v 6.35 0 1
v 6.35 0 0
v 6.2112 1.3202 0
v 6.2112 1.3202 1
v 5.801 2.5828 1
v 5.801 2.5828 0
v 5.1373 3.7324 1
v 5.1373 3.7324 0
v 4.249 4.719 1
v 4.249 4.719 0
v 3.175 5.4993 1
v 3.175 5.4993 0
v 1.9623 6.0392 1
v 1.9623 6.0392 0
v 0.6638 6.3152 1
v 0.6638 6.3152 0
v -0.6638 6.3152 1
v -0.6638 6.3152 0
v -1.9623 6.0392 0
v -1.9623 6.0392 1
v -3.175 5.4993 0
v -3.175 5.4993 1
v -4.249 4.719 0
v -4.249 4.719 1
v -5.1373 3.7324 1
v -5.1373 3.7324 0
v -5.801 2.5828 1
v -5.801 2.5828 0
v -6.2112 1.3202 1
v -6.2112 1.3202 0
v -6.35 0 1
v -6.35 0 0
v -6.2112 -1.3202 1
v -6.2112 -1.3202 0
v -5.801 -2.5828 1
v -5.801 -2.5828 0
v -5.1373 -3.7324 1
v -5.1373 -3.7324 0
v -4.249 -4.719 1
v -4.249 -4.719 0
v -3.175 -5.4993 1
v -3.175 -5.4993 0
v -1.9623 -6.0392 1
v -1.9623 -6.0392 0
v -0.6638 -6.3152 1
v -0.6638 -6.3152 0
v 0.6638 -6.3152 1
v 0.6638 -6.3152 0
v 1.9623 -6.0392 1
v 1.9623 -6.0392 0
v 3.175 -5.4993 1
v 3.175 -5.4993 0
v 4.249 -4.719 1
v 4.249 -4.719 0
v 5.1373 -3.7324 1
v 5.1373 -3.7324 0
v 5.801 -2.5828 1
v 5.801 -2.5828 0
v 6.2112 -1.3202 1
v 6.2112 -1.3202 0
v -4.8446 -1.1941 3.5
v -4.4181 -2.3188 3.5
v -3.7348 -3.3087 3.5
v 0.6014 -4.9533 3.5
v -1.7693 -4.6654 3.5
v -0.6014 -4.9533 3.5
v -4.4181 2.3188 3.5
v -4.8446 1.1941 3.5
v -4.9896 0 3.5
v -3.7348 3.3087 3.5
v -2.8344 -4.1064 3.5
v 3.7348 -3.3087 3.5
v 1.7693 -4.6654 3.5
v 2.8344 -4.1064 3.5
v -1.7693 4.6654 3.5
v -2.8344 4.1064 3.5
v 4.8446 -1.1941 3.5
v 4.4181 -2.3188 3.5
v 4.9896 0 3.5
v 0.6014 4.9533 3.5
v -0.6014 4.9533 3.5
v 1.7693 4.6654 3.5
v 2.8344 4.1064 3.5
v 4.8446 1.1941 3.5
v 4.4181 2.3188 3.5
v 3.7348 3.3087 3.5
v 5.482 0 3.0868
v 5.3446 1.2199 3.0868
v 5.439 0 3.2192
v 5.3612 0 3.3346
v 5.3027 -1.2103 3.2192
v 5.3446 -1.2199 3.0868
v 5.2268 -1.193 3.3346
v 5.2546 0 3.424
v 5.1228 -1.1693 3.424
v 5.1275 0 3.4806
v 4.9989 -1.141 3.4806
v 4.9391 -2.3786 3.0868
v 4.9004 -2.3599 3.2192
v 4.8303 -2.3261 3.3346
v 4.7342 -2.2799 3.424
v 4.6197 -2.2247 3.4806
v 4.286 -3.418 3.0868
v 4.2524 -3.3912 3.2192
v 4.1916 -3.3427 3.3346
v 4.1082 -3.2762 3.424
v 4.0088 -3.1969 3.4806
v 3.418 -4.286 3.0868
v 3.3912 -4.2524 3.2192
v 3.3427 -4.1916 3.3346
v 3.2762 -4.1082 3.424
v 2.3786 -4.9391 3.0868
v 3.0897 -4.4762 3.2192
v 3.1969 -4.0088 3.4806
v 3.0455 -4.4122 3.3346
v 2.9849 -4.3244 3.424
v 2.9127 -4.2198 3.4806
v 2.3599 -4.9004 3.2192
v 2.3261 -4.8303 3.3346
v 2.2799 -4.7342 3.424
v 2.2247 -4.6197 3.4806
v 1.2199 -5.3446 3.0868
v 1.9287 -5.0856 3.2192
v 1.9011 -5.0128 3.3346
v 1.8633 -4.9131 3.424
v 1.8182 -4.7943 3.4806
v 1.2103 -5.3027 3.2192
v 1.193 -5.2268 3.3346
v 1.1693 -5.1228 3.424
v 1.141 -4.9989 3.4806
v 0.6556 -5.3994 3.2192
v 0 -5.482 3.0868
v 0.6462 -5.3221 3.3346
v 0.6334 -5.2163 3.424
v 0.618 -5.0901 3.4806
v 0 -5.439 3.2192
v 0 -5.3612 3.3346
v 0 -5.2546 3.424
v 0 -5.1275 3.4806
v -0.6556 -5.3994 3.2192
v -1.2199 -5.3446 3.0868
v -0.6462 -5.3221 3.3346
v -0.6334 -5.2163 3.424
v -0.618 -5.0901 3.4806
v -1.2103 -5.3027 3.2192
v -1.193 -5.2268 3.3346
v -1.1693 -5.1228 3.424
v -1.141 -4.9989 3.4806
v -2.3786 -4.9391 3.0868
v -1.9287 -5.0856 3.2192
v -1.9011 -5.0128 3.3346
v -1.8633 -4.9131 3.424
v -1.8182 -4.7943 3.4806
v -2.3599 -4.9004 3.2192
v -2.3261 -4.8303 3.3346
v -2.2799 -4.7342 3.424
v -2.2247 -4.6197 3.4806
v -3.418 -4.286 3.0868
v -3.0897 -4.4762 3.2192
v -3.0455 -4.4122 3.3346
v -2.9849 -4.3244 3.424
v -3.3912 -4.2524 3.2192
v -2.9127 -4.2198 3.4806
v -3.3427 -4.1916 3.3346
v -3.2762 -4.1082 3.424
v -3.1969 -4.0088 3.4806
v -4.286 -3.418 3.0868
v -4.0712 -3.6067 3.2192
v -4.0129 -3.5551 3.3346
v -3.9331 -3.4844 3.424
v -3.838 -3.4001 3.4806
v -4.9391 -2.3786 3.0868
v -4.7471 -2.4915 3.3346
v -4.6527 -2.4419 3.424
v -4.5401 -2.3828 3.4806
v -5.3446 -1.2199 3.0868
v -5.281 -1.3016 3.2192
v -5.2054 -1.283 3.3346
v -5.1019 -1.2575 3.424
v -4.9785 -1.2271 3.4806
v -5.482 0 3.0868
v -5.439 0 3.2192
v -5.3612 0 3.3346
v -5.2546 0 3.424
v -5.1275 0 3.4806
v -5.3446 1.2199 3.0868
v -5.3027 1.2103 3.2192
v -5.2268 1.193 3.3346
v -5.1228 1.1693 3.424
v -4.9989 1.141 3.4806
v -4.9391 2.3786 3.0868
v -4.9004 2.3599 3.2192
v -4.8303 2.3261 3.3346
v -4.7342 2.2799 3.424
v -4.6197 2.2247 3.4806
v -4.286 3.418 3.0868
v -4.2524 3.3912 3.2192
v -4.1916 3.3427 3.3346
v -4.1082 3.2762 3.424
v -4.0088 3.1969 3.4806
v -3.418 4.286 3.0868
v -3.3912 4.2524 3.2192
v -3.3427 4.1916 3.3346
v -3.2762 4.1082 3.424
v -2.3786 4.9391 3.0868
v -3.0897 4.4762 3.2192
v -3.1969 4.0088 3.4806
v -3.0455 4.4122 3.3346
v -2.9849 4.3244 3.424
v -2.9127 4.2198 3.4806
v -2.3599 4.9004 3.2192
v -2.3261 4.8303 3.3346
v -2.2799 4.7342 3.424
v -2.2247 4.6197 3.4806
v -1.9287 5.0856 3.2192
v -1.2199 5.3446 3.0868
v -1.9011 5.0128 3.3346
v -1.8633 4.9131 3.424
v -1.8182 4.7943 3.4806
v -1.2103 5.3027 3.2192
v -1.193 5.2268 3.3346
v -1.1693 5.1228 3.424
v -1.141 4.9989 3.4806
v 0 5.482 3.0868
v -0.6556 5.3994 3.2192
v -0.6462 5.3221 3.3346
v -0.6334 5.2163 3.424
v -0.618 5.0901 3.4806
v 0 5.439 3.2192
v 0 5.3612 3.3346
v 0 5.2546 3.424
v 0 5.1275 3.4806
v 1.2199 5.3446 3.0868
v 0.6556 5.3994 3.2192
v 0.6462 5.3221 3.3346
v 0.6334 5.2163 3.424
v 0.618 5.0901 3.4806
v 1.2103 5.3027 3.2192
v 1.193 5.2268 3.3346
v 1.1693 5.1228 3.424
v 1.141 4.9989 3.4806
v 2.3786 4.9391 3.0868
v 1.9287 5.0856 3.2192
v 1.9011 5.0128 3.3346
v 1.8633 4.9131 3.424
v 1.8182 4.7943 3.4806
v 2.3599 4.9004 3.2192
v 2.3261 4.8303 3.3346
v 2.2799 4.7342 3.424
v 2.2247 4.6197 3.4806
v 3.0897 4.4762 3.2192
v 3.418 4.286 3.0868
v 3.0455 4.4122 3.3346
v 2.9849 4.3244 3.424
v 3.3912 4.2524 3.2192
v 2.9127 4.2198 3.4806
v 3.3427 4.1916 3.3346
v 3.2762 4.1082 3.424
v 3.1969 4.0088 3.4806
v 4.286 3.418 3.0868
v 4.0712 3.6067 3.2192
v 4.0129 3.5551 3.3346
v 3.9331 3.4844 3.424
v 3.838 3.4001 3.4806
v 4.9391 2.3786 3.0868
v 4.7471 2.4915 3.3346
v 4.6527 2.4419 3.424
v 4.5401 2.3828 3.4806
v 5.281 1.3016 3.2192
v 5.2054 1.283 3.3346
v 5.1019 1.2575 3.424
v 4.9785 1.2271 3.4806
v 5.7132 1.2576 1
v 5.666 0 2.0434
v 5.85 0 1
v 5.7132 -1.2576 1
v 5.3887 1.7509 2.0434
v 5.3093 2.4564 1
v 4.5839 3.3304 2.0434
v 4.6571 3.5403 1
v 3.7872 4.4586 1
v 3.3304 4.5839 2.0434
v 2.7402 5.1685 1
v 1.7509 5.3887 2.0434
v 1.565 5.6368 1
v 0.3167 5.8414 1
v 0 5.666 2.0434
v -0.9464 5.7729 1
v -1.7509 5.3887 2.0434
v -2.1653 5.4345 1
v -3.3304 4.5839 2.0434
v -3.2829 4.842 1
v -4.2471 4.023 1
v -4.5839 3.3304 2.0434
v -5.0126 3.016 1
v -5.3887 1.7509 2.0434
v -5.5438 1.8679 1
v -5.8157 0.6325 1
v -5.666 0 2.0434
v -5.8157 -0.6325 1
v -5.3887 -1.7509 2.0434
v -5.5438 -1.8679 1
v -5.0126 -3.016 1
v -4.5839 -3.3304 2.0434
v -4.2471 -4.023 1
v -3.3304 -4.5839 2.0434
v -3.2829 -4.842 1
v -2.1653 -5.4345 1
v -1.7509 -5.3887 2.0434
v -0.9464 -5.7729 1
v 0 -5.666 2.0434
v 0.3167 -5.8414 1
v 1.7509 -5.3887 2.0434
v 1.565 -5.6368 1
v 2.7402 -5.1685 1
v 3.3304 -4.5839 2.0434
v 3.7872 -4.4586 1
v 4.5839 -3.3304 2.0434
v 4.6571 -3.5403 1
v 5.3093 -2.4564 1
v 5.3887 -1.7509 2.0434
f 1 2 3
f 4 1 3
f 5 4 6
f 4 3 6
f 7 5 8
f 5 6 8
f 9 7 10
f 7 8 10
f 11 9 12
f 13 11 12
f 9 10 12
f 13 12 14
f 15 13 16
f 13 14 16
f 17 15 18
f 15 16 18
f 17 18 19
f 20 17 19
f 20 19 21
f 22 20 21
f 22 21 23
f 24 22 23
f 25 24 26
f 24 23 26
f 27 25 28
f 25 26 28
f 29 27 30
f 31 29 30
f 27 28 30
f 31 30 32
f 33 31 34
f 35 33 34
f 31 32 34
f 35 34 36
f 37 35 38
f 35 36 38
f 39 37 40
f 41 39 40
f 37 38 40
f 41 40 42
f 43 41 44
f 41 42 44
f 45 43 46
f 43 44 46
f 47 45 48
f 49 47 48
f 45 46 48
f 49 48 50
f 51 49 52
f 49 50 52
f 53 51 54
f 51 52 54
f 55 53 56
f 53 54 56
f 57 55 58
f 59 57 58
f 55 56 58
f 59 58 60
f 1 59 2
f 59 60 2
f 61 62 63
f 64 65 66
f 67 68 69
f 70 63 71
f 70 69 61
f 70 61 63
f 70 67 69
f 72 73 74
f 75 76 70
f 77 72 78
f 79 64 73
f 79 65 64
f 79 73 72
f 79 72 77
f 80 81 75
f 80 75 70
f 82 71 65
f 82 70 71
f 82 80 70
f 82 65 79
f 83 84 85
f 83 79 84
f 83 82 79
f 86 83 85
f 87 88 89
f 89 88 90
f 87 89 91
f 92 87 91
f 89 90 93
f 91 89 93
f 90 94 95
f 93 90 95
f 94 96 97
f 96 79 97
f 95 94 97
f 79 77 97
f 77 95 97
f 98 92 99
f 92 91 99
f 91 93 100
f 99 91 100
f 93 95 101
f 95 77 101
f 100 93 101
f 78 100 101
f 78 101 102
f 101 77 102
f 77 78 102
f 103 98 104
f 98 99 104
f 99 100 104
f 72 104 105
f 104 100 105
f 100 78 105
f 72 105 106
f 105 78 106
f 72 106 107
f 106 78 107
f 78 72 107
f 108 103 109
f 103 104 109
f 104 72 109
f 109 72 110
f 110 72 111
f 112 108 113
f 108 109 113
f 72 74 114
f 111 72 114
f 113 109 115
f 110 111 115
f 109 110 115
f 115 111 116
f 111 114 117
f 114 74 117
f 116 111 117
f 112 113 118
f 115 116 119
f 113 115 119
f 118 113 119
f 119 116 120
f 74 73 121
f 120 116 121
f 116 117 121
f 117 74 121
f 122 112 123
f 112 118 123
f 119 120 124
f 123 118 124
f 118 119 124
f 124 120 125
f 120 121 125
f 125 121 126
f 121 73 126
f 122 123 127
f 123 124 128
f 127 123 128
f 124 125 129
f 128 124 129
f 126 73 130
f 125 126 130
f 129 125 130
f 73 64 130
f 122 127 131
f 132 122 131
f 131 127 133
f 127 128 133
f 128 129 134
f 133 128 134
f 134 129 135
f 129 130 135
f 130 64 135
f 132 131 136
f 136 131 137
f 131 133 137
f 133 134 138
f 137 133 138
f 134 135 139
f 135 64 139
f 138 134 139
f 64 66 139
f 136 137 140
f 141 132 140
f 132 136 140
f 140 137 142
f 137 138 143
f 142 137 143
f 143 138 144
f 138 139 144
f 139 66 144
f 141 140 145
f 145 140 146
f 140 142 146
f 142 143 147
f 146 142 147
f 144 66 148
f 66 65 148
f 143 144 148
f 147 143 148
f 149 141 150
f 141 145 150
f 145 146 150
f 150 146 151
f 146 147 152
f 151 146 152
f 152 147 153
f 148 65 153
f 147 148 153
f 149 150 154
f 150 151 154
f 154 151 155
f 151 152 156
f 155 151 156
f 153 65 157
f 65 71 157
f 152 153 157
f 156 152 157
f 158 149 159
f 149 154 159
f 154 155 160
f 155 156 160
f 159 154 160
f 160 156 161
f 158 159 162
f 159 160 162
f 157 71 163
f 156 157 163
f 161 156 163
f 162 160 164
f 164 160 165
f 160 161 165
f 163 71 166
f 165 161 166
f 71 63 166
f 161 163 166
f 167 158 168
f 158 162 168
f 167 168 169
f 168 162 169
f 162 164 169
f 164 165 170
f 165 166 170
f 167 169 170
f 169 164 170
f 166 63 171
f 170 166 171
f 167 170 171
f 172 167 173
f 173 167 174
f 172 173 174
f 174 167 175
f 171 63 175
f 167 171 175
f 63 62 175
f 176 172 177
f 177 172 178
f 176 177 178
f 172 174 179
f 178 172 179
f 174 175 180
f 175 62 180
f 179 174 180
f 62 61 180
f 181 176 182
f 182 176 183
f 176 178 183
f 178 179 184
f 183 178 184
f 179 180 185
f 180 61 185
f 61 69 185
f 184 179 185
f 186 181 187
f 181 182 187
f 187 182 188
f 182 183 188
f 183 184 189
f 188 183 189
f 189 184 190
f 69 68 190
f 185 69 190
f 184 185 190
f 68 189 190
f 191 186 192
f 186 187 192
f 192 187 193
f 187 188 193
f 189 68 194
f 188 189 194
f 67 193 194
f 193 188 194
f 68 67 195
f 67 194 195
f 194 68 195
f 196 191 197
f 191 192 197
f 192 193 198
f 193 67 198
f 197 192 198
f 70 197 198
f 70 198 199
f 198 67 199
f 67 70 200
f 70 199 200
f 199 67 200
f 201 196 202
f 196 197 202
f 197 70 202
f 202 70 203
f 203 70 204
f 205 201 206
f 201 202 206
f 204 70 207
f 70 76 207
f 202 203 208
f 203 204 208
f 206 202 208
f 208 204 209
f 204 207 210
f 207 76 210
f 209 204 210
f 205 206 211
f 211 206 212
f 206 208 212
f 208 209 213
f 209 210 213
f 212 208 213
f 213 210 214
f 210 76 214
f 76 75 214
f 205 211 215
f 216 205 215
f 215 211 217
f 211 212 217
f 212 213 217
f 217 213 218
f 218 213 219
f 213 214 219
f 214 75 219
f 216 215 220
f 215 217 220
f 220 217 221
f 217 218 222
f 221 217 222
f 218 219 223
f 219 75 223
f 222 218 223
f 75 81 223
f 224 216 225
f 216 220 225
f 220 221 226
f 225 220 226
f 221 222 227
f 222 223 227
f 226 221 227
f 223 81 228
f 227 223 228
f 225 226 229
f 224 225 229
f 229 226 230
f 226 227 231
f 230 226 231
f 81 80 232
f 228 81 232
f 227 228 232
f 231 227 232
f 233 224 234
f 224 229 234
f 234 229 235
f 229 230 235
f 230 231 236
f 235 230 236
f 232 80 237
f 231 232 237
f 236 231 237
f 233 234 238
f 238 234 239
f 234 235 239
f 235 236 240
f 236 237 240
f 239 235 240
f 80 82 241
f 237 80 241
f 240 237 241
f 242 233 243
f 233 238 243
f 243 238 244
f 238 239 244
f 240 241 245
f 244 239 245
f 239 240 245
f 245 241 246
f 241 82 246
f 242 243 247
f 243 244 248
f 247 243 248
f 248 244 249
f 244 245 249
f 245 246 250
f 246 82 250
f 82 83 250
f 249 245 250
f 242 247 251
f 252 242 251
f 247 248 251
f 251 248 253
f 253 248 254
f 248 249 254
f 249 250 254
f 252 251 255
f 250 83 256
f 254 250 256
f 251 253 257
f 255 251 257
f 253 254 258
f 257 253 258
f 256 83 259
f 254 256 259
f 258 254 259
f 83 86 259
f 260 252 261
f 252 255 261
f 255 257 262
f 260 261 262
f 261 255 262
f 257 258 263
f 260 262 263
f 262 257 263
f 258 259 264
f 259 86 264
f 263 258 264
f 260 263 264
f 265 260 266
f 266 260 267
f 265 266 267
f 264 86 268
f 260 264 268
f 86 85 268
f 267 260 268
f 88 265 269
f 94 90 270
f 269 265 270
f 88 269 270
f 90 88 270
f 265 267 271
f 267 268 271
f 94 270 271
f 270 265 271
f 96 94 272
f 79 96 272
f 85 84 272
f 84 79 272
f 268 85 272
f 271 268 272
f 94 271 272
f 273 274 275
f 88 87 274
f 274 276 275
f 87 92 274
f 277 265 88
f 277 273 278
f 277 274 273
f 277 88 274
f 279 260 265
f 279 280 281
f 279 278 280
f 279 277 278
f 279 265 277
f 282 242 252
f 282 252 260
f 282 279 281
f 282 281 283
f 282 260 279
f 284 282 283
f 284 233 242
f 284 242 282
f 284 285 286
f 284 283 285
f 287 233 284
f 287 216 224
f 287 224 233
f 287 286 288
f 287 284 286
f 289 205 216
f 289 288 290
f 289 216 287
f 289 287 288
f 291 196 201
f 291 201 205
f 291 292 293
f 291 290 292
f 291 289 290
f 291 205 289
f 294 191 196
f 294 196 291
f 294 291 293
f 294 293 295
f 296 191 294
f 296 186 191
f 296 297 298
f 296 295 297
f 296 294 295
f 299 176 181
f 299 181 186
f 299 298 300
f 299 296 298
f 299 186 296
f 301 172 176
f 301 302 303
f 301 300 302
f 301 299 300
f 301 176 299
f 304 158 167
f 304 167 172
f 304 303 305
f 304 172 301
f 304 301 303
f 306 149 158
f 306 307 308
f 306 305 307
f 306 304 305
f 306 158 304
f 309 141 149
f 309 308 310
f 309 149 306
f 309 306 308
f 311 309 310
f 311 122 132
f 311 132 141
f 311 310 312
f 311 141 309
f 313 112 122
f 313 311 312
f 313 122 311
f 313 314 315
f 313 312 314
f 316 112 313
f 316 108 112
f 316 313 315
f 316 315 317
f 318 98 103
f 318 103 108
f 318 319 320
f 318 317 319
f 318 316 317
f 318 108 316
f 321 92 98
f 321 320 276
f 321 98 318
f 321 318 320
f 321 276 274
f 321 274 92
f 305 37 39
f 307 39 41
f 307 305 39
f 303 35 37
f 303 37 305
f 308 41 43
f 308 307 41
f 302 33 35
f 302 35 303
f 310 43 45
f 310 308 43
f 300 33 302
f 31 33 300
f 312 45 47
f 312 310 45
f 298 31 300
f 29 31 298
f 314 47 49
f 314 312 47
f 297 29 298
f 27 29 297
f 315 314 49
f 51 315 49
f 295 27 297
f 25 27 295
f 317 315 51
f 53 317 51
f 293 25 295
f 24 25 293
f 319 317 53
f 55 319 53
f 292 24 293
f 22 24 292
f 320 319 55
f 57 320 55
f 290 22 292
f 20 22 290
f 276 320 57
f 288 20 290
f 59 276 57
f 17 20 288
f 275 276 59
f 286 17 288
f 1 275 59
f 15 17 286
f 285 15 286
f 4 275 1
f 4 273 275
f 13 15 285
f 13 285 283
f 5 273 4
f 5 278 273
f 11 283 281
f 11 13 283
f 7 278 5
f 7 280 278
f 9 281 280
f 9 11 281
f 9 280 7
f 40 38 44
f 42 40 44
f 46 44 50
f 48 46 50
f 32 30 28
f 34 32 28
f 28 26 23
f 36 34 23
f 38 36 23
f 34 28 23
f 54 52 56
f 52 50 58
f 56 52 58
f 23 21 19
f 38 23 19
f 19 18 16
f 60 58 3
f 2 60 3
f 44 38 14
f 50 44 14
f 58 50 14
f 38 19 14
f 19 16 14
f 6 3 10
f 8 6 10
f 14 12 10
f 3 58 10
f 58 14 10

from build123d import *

# Parameters (mm, degrees)
BASE_R                   = 6.35
BOSS_EXTRU_1_BASE_DEPTH  = 1
PATIN_R                  = 5.85
BOSS_EXTRU_2_PATIN_DEPTH = 2.5
BOSS_EXTRU_2_PATIN_TAPER = 10
CONG_1_0_5MM_PATIN_R     = 0.5


with BuildPart() as part:
    # Base → Boss.-Extru.1_Base (new body)
    with BuildSketch(Plane.XY):
        Circle(BASE_R)
    extrude(amount=BOSS_EXTRU_1_BASE_DEPTH)

    # Patin → Boss.-Extru.2_Patin (add)
    with BuildSketch(Plane.XY.offset(1)):
        Circle(PATIN_R)
    extrude(amount=BOSS_EXTRU_2_PATIN_DEPTH, taper=BOSS_EXTRU_2_PATIN_TAPER)

    # Congé1_0.5mm_Patin
    cong_1_0_5mm_patin_edges = [part.edges().sort_by_distance(p)[0] for p in [
        (-5.409182548, 0, 3.5),
    ]]
    fillet(cong_1_0_5mm_patin_edges, radius=CONG_1_0_5MM_PATIN_R)


solid = part.part
